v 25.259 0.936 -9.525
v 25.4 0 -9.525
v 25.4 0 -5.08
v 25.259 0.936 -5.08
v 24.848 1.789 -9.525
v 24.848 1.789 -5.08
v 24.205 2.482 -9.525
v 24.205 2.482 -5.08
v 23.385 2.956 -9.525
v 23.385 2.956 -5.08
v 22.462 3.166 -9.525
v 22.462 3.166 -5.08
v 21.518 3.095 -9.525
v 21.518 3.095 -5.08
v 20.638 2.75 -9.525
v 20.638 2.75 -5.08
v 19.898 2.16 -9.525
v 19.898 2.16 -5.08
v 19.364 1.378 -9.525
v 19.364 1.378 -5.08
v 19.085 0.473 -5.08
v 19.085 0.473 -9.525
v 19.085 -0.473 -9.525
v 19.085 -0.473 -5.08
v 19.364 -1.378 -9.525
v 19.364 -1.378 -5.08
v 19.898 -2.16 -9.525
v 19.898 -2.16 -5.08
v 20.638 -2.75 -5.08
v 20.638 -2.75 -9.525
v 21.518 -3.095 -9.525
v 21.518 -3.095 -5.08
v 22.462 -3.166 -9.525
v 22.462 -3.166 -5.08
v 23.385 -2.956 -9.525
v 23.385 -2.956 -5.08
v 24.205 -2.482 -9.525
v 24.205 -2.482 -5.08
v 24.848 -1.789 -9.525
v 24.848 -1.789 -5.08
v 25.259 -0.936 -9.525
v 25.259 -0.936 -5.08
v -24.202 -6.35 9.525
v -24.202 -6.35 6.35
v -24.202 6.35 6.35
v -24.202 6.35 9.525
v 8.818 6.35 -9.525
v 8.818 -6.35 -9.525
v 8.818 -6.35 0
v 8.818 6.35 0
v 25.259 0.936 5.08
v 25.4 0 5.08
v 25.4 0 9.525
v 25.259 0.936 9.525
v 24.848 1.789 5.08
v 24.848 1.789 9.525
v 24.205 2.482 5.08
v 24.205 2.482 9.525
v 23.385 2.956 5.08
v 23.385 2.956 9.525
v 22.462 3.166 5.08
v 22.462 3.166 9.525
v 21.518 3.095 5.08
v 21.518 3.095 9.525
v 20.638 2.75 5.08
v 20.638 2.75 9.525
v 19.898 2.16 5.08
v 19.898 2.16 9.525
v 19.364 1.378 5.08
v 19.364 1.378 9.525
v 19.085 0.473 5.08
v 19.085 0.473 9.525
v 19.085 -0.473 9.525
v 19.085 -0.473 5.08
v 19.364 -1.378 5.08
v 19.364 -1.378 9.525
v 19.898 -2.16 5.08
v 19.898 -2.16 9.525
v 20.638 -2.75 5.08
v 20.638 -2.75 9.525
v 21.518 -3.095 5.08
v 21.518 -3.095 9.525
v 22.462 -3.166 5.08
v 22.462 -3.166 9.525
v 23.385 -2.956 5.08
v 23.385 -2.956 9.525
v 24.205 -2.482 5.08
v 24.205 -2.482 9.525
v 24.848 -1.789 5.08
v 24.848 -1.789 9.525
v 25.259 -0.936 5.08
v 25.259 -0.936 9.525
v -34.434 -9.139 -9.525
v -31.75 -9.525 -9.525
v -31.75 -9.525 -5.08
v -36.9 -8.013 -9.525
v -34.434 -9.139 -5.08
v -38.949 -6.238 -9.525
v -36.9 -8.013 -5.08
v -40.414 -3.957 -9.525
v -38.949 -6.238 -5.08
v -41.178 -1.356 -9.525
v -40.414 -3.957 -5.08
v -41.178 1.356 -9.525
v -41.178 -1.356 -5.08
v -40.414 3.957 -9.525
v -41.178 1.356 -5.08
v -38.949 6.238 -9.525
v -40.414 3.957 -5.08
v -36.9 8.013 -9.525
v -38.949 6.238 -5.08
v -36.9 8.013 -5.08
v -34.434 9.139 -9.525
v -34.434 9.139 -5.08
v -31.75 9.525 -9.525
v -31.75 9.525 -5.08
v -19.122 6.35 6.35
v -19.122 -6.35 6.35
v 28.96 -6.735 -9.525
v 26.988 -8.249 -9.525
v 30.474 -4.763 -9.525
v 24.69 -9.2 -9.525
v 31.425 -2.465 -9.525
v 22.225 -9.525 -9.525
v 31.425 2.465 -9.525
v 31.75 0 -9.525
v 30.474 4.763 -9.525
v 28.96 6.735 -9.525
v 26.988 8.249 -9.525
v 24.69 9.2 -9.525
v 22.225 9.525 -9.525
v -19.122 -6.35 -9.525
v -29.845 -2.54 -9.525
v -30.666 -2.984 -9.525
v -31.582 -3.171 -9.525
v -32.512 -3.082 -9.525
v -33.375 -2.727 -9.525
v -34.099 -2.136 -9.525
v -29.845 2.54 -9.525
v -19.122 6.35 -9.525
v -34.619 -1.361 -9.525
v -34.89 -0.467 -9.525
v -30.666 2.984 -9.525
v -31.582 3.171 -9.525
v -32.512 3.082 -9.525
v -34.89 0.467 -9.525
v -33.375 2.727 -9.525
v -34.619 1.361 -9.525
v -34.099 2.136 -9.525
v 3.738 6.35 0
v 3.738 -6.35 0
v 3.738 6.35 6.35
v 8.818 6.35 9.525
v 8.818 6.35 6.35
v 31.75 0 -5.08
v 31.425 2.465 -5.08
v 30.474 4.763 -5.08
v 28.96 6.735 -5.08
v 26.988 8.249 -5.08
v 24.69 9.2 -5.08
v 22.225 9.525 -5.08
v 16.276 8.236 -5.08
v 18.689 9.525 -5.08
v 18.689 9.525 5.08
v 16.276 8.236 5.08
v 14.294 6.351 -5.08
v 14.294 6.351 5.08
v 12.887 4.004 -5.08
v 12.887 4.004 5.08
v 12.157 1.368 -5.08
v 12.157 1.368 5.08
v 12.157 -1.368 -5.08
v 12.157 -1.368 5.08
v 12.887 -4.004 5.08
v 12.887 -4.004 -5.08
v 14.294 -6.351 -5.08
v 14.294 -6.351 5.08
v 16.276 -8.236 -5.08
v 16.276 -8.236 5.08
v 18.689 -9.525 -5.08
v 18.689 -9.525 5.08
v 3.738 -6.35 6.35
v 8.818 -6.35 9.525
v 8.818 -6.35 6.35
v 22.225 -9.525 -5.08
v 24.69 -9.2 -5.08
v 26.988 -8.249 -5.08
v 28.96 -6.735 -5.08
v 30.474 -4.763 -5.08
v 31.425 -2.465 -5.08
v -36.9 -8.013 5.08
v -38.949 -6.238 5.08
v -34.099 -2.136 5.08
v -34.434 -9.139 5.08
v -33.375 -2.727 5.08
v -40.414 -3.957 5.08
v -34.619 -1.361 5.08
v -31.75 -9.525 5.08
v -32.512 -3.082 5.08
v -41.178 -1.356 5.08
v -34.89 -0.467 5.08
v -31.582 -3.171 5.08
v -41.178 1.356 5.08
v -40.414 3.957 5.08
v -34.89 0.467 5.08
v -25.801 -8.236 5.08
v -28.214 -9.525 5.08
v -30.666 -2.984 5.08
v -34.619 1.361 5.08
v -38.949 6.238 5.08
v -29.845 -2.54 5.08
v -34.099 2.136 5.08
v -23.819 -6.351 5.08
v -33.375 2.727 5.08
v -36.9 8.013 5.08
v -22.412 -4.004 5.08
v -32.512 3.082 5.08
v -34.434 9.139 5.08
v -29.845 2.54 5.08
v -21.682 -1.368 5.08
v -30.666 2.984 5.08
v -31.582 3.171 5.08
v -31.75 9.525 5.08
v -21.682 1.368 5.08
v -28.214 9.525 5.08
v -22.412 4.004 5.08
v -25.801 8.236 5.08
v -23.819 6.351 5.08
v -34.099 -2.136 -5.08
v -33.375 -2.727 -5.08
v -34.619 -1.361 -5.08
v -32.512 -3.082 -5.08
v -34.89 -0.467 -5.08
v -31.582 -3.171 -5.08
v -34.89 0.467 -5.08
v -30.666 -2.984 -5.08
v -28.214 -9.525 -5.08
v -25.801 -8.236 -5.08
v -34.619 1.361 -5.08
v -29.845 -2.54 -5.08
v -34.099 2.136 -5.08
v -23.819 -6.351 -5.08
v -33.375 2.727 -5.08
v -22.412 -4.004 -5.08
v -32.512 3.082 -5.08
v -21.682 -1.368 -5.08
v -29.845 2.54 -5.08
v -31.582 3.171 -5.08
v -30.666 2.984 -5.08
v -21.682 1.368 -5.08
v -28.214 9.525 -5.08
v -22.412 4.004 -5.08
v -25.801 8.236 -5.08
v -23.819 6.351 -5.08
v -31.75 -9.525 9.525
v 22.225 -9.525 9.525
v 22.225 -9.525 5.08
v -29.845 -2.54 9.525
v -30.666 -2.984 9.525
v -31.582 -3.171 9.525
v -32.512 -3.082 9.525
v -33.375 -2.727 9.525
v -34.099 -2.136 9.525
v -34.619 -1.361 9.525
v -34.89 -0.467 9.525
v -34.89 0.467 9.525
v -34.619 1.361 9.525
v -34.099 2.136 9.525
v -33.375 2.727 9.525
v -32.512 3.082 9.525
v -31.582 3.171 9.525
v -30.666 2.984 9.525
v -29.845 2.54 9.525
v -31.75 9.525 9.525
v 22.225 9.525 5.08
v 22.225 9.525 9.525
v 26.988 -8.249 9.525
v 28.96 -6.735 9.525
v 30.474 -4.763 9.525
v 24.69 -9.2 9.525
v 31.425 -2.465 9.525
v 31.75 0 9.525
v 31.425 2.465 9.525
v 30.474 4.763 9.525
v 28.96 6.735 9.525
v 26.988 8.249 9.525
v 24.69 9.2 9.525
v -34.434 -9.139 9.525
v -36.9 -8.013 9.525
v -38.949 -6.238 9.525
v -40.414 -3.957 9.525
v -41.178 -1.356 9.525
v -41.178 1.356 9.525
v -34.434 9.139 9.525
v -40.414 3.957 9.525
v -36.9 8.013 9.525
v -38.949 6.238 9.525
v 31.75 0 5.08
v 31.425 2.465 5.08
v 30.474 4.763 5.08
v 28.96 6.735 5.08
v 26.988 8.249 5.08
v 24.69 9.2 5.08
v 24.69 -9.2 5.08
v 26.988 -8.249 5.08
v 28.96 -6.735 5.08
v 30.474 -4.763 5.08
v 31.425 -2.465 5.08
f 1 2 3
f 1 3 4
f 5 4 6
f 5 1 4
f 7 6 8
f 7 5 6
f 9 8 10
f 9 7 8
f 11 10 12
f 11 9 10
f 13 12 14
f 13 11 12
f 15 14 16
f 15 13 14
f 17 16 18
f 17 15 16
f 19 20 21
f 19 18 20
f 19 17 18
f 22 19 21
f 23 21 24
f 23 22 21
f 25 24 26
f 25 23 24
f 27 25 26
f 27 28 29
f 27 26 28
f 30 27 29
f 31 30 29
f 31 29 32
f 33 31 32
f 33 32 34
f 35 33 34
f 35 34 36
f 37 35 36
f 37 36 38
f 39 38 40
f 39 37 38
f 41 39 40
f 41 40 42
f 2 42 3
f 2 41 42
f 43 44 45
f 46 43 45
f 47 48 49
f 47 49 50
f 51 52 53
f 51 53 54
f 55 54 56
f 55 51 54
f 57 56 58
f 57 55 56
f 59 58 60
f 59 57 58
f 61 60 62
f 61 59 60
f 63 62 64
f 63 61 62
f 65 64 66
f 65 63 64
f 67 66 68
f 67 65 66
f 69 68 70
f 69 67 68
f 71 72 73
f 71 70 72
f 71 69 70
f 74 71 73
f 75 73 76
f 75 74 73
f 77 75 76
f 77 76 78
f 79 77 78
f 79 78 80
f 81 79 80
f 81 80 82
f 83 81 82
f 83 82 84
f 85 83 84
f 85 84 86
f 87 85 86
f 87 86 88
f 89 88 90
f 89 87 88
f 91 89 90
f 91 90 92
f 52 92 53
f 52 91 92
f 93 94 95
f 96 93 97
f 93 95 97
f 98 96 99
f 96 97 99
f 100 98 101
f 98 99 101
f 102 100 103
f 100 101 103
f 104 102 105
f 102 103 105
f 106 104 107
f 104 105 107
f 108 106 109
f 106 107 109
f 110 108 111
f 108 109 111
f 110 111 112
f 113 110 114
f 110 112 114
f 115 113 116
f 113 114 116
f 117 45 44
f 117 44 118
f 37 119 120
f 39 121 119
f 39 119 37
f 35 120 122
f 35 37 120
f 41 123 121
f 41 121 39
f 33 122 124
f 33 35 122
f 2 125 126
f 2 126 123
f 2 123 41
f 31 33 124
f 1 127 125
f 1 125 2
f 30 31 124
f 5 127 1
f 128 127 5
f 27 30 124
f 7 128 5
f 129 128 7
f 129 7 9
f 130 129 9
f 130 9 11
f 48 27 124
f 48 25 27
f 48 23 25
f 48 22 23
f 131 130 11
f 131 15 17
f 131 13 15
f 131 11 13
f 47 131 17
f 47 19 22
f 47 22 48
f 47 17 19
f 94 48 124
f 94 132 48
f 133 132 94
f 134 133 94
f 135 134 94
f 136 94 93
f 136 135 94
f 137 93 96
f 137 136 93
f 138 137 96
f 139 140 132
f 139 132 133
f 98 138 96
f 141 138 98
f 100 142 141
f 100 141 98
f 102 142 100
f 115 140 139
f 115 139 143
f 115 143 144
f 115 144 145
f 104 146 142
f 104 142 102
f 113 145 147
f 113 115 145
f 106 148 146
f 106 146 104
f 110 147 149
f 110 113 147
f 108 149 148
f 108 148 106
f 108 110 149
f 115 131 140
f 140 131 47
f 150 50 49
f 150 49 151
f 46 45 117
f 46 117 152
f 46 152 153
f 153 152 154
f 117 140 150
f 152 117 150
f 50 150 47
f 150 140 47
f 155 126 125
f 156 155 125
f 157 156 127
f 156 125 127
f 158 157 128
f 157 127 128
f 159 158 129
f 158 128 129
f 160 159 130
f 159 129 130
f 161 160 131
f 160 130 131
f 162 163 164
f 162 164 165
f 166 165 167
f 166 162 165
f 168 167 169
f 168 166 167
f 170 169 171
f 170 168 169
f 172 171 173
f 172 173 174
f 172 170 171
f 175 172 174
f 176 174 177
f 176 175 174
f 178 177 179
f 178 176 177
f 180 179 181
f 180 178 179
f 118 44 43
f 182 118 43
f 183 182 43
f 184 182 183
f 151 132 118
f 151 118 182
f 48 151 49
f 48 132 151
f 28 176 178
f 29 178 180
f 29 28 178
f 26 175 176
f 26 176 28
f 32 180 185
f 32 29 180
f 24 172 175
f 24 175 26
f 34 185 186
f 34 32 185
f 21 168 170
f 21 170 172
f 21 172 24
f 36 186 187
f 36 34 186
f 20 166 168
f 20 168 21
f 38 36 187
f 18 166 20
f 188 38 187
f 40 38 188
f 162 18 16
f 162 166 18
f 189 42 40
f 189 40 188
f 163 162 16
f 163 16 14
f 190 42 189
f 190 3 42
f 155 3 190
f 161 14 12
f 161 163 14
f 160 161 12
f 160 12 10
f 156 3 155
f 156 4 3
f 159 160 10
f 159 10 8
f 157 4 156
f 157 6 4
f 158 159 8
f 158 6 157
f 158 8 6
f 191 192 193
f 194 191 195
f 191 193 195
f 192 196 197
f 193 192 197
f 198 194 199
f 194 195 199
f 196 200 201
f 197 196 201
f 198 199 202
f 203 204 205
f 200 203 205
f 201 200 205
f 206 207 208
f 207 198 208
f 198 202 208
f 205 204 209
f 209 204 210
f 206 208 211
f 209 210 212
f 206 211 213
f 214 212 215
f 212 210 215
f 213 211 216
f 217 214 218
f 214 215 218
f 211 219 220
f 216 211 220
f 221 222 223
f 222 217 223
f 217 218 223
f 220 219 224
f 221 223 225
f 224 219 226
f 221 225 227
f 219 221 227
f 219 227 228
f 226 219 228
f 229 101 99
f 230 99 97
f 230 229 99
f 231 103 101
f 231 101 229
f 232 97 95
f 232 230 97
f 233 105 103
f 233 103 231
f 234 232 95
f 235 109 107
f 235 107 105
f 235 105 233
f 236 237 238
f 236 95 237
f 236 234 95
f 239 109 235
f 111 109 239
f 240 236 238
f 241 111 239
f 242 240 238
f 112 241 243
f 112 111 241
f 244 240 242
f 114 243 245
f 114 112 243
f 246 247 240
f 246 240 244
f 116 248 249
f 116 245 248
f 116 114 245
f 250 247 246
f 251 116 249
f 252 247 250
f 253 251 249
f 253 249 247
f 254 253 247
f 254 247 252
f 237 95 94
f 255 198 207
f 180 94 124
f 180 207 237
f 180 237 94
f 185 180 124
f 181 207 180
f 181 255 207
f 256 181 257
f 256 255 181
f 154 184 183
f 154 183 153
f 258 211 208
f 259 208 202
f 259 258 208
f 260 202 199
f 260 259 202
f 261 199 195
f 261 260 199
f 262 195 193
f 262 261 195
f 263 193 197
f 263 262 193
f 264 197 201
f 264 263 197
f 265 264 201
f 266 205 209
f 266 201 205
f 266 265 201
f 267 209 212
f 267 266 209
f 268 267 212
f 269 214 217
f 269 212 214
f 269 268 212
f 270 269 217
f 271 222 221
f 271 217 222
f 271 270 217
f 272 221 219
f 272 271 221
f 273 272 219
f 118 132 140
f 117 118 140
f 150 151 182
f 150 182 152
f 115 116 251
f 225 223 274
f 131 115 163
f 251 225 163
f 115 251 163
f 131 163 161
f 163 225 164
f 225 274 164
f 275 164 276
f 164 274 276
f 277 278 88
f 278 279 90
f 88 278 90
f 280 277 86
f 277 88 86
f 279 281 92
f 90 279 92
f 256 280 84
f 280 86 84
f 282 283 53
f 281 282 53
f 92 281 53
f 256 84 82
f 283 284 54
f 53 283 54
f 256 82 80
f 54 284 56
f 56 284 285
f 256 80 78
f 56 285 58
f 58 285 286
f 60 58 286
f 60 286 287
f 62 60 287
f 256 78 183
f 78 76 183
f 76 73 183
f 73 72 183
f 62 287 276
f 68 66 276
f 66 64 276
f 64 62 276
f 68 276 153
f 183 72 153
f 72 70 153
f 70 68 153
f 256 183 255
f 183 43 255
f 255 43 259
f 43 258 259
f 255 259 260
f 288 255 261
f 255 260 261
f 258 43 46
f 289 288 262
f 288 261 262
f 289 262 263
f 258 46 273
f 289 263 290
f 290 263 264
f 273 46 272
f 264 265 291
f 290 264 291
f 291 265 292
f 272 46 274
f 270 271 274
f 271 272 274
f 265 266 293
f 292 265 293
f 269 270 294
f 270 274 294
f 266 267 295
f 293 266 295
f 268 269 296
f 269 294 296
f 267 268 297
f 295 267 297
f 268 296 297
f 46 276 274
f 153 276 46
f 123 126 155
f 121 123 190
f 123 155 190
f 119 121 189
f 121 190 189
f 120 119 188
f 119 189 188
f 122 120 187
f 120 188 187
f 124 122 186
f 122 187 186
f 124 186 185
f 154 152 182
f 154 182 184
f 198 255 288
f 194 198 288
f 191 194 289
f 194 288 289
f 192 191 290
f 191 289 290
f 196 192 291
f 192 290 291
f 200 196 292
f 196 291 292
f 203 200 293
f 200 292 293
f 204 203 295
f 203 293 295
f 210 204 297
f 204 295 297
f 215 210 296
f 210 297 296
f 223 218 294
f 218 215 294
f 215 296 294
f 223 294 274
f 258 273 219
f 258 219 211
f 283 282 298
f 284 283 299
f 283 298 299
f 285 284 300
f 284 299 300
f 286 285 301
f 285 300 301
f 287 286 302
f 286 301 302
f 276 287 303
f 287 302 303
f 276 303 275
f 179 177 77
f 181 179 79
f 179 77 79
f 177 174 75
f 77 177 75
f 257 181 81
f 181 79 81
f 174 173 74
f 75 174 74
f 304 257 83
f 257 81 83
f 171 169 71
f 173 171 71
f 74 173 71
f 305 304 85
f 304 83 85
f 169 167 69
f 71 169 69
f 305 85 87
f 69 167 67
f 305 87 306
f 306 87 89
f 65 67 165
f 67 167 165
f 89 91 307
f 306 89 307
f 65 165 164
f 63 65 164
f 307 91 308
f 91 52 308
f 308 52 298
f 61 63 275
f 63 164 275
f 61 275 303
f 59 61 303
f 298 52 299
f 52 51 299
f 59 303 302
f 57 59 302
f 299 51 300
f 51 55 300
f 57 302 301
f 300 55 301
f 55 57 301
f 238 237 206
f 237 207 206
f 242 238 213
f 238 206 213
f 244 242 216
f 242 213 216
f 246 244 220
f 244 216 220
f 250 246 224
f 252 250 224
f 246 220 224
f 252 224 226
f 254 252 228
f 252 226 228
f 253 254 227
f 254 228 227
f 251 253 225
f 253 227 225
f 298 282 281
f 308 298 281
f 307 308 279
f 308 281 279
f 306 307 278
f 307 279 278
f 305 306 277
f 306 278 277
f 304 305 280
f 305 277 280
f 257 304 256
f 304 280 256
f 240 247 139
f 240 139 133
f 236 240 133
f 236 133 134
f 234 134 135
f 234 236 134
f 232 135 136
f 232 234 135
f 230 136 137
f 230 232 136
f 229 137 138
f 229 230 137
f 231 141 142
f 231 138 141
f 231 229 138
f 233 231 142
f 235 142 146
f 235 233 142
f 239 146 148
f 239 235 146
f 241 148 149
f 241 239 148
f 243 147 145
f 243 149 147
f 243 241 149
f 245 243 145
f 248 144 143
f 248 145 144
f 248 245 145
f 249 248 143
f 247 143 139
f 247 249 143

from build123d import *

# Parameters (mm, degrees)
SKETCH1_W               = 63.5
SKETCH1_H               = 19.05
BOSS_EXTRUDE1_DEPTH     = 9.525
FILLET1_R               = 9.525
CUT_EXTRUDE1_DEPTH      = 39.232062788
CUT_EXTRUDE1_DEPTH_BACK = 39.232062788
SKETCH2_R               = 3.175
CUT_EXTRUDE2_DEPTH      = 39.232062788
CUT_EXTRUDE2_DEPTH_BACK = 3.175
SKETCH3_W               = 33.02
SKETCH3_H               = 12.7
SKETCH6_W               = 22.86
SKETCH6_H               = 12.7
CUT_EXTRUDE4_DEPTH      = 39.232062788
SKETCH7_W               = 5.08
SKETCH7_H               = 12.7
CUT_EXTRUDE5_DEPTH      = 9.525
BOSS_EXTRUDE2_DEPTH     = 19.05
CUT_EXTRUDE6_DEPTH      = 47.446245812
SKETCH4_R               = 10.16
CUT_EXTRUDE3_DEPTH      = 5.08


with BuildPart() as part:
    # Sketch1 → Boss-Extrude1 (new, symmetric)
    with BuildSketch(Plane.XY):
        Rectangle(SKETCH1_W, SKETCH1_H)
    extrude(amount=BOSS_EXTRUDE1_DEPTH, both=True)

    # Fillet1
    fillet1_edges = [part.edges().sort_by_distance(p)[0] for p in [
        (31.75, -9.525, 0),
        (31.75, 9.525, 0),
    ]]
    fillet(fillet1_edges, radius=FILLET1_R - 0.0001)  # a hair under: the kernel refuses the full size

    # Sketch2 → Cut-Extrude1 (cut, two sides: drawn at the far end of the back side and taken through both)
    with BuildSketch(Plane.XY.offset(9.525).offset(-CUT_EXTRUDE1_DEPTH_BACK)):
        with Locations((22.225, 0)):
            Circle(SKETCH2_R)
    extrude(amount=CUT_EXTRUDE1_DEPTH + CUT_EXTRUDE1_DEPTH_BACK, mode=Mode.SUBTRACT)

    # Sketch3 → Cut-Extrude2 (cut, two sides: drawn at the far end of the back side and taken through both)
    with BuildSketch(Plane.XY.offset(9.525).offset(-CUT_EXTRUDE2_DEPTH_BACK)):
        with Locations((-7.691525386, 0)):
            Rectangle(SKETCH3_W, SKETCH3_H)
    extrude(amount=CUT_EXTRUDE2_DEPTH + CUT_EXTRUDE2_DEPTH_BACK, mode=Mode.SUBTRACT)

    # Sketch6 → Cut-Extrude4 (cut, through all)
    with BuildSketch(Plane(origin=(0, 0, -9.525), x_dir=(-1, 0, 0), z_dir=(0, 0, -1))):
        with Locations((7.691525386, 0)):
            Rectangle(SKETCH6_W, SKETCH6_H)
    extrude(amount=-CUT_EXTRUDE4_DEPTH, mode=Mode.SUBTRACT)

    # Sketch7 → Cut-Extrude5 (cut)
    with BuildSketch(Plane(origin=(0, 0, -9.525), x_dir=(-1, 0, 0), z_dir=(0, 0, -1))):
        with Locations((-6.278474614, 0)):
            Rectangle(SKETCH7_W, SKETCH7_H)
    extrude(amount=-CUT_EXTRUDE5_DEPTH, mode=Mode.SUBTRACT)

    # Sketch8 → Boss-Extrude2 (add)
    with BuildSketch(Plane.XY.offset(9.525)):
        with BuildLine():
            Line((-31.75, 9.525), (-31.75, -9.525))
            ThreePointArc((-31.75, -9.525), (-41.275, 0), (-31.75, 9.525))
        make_face()
    extrude(amount=-BOSS_EXTRUDE2_DEPTH)

    # Sketch9 → Cut-Extrude6 (cut, through all)
    with BuildSketch(Plane.XY.offset(9.525)):
        with BuildLine():
            Line((-29.845, 2.54), (-29.845, -2.54))
            ThreePointArc((-29.845, -2.54), (-34.925, 0), (-29.845, 2.54))
        make_face()
    extrude(amount=-CUT_EXTRUDE6_DEPTH, mode=Mode.SUBTRACT)

    # Sketch4 → Cut-Extrude3 (cut, symmetric)
    with BuildSketch(Plane.XY):
        with Locations((22.225, 0)):
            Circle(SKETCH4_R)
        with Locations((-31.75, 0)):
            Circle(SKETCH4_R)
    extrude(amount=CUT_EXTRUDE3_DEPTH, both=True, mode=Mode.SUBTRACT)


solid = part.part
